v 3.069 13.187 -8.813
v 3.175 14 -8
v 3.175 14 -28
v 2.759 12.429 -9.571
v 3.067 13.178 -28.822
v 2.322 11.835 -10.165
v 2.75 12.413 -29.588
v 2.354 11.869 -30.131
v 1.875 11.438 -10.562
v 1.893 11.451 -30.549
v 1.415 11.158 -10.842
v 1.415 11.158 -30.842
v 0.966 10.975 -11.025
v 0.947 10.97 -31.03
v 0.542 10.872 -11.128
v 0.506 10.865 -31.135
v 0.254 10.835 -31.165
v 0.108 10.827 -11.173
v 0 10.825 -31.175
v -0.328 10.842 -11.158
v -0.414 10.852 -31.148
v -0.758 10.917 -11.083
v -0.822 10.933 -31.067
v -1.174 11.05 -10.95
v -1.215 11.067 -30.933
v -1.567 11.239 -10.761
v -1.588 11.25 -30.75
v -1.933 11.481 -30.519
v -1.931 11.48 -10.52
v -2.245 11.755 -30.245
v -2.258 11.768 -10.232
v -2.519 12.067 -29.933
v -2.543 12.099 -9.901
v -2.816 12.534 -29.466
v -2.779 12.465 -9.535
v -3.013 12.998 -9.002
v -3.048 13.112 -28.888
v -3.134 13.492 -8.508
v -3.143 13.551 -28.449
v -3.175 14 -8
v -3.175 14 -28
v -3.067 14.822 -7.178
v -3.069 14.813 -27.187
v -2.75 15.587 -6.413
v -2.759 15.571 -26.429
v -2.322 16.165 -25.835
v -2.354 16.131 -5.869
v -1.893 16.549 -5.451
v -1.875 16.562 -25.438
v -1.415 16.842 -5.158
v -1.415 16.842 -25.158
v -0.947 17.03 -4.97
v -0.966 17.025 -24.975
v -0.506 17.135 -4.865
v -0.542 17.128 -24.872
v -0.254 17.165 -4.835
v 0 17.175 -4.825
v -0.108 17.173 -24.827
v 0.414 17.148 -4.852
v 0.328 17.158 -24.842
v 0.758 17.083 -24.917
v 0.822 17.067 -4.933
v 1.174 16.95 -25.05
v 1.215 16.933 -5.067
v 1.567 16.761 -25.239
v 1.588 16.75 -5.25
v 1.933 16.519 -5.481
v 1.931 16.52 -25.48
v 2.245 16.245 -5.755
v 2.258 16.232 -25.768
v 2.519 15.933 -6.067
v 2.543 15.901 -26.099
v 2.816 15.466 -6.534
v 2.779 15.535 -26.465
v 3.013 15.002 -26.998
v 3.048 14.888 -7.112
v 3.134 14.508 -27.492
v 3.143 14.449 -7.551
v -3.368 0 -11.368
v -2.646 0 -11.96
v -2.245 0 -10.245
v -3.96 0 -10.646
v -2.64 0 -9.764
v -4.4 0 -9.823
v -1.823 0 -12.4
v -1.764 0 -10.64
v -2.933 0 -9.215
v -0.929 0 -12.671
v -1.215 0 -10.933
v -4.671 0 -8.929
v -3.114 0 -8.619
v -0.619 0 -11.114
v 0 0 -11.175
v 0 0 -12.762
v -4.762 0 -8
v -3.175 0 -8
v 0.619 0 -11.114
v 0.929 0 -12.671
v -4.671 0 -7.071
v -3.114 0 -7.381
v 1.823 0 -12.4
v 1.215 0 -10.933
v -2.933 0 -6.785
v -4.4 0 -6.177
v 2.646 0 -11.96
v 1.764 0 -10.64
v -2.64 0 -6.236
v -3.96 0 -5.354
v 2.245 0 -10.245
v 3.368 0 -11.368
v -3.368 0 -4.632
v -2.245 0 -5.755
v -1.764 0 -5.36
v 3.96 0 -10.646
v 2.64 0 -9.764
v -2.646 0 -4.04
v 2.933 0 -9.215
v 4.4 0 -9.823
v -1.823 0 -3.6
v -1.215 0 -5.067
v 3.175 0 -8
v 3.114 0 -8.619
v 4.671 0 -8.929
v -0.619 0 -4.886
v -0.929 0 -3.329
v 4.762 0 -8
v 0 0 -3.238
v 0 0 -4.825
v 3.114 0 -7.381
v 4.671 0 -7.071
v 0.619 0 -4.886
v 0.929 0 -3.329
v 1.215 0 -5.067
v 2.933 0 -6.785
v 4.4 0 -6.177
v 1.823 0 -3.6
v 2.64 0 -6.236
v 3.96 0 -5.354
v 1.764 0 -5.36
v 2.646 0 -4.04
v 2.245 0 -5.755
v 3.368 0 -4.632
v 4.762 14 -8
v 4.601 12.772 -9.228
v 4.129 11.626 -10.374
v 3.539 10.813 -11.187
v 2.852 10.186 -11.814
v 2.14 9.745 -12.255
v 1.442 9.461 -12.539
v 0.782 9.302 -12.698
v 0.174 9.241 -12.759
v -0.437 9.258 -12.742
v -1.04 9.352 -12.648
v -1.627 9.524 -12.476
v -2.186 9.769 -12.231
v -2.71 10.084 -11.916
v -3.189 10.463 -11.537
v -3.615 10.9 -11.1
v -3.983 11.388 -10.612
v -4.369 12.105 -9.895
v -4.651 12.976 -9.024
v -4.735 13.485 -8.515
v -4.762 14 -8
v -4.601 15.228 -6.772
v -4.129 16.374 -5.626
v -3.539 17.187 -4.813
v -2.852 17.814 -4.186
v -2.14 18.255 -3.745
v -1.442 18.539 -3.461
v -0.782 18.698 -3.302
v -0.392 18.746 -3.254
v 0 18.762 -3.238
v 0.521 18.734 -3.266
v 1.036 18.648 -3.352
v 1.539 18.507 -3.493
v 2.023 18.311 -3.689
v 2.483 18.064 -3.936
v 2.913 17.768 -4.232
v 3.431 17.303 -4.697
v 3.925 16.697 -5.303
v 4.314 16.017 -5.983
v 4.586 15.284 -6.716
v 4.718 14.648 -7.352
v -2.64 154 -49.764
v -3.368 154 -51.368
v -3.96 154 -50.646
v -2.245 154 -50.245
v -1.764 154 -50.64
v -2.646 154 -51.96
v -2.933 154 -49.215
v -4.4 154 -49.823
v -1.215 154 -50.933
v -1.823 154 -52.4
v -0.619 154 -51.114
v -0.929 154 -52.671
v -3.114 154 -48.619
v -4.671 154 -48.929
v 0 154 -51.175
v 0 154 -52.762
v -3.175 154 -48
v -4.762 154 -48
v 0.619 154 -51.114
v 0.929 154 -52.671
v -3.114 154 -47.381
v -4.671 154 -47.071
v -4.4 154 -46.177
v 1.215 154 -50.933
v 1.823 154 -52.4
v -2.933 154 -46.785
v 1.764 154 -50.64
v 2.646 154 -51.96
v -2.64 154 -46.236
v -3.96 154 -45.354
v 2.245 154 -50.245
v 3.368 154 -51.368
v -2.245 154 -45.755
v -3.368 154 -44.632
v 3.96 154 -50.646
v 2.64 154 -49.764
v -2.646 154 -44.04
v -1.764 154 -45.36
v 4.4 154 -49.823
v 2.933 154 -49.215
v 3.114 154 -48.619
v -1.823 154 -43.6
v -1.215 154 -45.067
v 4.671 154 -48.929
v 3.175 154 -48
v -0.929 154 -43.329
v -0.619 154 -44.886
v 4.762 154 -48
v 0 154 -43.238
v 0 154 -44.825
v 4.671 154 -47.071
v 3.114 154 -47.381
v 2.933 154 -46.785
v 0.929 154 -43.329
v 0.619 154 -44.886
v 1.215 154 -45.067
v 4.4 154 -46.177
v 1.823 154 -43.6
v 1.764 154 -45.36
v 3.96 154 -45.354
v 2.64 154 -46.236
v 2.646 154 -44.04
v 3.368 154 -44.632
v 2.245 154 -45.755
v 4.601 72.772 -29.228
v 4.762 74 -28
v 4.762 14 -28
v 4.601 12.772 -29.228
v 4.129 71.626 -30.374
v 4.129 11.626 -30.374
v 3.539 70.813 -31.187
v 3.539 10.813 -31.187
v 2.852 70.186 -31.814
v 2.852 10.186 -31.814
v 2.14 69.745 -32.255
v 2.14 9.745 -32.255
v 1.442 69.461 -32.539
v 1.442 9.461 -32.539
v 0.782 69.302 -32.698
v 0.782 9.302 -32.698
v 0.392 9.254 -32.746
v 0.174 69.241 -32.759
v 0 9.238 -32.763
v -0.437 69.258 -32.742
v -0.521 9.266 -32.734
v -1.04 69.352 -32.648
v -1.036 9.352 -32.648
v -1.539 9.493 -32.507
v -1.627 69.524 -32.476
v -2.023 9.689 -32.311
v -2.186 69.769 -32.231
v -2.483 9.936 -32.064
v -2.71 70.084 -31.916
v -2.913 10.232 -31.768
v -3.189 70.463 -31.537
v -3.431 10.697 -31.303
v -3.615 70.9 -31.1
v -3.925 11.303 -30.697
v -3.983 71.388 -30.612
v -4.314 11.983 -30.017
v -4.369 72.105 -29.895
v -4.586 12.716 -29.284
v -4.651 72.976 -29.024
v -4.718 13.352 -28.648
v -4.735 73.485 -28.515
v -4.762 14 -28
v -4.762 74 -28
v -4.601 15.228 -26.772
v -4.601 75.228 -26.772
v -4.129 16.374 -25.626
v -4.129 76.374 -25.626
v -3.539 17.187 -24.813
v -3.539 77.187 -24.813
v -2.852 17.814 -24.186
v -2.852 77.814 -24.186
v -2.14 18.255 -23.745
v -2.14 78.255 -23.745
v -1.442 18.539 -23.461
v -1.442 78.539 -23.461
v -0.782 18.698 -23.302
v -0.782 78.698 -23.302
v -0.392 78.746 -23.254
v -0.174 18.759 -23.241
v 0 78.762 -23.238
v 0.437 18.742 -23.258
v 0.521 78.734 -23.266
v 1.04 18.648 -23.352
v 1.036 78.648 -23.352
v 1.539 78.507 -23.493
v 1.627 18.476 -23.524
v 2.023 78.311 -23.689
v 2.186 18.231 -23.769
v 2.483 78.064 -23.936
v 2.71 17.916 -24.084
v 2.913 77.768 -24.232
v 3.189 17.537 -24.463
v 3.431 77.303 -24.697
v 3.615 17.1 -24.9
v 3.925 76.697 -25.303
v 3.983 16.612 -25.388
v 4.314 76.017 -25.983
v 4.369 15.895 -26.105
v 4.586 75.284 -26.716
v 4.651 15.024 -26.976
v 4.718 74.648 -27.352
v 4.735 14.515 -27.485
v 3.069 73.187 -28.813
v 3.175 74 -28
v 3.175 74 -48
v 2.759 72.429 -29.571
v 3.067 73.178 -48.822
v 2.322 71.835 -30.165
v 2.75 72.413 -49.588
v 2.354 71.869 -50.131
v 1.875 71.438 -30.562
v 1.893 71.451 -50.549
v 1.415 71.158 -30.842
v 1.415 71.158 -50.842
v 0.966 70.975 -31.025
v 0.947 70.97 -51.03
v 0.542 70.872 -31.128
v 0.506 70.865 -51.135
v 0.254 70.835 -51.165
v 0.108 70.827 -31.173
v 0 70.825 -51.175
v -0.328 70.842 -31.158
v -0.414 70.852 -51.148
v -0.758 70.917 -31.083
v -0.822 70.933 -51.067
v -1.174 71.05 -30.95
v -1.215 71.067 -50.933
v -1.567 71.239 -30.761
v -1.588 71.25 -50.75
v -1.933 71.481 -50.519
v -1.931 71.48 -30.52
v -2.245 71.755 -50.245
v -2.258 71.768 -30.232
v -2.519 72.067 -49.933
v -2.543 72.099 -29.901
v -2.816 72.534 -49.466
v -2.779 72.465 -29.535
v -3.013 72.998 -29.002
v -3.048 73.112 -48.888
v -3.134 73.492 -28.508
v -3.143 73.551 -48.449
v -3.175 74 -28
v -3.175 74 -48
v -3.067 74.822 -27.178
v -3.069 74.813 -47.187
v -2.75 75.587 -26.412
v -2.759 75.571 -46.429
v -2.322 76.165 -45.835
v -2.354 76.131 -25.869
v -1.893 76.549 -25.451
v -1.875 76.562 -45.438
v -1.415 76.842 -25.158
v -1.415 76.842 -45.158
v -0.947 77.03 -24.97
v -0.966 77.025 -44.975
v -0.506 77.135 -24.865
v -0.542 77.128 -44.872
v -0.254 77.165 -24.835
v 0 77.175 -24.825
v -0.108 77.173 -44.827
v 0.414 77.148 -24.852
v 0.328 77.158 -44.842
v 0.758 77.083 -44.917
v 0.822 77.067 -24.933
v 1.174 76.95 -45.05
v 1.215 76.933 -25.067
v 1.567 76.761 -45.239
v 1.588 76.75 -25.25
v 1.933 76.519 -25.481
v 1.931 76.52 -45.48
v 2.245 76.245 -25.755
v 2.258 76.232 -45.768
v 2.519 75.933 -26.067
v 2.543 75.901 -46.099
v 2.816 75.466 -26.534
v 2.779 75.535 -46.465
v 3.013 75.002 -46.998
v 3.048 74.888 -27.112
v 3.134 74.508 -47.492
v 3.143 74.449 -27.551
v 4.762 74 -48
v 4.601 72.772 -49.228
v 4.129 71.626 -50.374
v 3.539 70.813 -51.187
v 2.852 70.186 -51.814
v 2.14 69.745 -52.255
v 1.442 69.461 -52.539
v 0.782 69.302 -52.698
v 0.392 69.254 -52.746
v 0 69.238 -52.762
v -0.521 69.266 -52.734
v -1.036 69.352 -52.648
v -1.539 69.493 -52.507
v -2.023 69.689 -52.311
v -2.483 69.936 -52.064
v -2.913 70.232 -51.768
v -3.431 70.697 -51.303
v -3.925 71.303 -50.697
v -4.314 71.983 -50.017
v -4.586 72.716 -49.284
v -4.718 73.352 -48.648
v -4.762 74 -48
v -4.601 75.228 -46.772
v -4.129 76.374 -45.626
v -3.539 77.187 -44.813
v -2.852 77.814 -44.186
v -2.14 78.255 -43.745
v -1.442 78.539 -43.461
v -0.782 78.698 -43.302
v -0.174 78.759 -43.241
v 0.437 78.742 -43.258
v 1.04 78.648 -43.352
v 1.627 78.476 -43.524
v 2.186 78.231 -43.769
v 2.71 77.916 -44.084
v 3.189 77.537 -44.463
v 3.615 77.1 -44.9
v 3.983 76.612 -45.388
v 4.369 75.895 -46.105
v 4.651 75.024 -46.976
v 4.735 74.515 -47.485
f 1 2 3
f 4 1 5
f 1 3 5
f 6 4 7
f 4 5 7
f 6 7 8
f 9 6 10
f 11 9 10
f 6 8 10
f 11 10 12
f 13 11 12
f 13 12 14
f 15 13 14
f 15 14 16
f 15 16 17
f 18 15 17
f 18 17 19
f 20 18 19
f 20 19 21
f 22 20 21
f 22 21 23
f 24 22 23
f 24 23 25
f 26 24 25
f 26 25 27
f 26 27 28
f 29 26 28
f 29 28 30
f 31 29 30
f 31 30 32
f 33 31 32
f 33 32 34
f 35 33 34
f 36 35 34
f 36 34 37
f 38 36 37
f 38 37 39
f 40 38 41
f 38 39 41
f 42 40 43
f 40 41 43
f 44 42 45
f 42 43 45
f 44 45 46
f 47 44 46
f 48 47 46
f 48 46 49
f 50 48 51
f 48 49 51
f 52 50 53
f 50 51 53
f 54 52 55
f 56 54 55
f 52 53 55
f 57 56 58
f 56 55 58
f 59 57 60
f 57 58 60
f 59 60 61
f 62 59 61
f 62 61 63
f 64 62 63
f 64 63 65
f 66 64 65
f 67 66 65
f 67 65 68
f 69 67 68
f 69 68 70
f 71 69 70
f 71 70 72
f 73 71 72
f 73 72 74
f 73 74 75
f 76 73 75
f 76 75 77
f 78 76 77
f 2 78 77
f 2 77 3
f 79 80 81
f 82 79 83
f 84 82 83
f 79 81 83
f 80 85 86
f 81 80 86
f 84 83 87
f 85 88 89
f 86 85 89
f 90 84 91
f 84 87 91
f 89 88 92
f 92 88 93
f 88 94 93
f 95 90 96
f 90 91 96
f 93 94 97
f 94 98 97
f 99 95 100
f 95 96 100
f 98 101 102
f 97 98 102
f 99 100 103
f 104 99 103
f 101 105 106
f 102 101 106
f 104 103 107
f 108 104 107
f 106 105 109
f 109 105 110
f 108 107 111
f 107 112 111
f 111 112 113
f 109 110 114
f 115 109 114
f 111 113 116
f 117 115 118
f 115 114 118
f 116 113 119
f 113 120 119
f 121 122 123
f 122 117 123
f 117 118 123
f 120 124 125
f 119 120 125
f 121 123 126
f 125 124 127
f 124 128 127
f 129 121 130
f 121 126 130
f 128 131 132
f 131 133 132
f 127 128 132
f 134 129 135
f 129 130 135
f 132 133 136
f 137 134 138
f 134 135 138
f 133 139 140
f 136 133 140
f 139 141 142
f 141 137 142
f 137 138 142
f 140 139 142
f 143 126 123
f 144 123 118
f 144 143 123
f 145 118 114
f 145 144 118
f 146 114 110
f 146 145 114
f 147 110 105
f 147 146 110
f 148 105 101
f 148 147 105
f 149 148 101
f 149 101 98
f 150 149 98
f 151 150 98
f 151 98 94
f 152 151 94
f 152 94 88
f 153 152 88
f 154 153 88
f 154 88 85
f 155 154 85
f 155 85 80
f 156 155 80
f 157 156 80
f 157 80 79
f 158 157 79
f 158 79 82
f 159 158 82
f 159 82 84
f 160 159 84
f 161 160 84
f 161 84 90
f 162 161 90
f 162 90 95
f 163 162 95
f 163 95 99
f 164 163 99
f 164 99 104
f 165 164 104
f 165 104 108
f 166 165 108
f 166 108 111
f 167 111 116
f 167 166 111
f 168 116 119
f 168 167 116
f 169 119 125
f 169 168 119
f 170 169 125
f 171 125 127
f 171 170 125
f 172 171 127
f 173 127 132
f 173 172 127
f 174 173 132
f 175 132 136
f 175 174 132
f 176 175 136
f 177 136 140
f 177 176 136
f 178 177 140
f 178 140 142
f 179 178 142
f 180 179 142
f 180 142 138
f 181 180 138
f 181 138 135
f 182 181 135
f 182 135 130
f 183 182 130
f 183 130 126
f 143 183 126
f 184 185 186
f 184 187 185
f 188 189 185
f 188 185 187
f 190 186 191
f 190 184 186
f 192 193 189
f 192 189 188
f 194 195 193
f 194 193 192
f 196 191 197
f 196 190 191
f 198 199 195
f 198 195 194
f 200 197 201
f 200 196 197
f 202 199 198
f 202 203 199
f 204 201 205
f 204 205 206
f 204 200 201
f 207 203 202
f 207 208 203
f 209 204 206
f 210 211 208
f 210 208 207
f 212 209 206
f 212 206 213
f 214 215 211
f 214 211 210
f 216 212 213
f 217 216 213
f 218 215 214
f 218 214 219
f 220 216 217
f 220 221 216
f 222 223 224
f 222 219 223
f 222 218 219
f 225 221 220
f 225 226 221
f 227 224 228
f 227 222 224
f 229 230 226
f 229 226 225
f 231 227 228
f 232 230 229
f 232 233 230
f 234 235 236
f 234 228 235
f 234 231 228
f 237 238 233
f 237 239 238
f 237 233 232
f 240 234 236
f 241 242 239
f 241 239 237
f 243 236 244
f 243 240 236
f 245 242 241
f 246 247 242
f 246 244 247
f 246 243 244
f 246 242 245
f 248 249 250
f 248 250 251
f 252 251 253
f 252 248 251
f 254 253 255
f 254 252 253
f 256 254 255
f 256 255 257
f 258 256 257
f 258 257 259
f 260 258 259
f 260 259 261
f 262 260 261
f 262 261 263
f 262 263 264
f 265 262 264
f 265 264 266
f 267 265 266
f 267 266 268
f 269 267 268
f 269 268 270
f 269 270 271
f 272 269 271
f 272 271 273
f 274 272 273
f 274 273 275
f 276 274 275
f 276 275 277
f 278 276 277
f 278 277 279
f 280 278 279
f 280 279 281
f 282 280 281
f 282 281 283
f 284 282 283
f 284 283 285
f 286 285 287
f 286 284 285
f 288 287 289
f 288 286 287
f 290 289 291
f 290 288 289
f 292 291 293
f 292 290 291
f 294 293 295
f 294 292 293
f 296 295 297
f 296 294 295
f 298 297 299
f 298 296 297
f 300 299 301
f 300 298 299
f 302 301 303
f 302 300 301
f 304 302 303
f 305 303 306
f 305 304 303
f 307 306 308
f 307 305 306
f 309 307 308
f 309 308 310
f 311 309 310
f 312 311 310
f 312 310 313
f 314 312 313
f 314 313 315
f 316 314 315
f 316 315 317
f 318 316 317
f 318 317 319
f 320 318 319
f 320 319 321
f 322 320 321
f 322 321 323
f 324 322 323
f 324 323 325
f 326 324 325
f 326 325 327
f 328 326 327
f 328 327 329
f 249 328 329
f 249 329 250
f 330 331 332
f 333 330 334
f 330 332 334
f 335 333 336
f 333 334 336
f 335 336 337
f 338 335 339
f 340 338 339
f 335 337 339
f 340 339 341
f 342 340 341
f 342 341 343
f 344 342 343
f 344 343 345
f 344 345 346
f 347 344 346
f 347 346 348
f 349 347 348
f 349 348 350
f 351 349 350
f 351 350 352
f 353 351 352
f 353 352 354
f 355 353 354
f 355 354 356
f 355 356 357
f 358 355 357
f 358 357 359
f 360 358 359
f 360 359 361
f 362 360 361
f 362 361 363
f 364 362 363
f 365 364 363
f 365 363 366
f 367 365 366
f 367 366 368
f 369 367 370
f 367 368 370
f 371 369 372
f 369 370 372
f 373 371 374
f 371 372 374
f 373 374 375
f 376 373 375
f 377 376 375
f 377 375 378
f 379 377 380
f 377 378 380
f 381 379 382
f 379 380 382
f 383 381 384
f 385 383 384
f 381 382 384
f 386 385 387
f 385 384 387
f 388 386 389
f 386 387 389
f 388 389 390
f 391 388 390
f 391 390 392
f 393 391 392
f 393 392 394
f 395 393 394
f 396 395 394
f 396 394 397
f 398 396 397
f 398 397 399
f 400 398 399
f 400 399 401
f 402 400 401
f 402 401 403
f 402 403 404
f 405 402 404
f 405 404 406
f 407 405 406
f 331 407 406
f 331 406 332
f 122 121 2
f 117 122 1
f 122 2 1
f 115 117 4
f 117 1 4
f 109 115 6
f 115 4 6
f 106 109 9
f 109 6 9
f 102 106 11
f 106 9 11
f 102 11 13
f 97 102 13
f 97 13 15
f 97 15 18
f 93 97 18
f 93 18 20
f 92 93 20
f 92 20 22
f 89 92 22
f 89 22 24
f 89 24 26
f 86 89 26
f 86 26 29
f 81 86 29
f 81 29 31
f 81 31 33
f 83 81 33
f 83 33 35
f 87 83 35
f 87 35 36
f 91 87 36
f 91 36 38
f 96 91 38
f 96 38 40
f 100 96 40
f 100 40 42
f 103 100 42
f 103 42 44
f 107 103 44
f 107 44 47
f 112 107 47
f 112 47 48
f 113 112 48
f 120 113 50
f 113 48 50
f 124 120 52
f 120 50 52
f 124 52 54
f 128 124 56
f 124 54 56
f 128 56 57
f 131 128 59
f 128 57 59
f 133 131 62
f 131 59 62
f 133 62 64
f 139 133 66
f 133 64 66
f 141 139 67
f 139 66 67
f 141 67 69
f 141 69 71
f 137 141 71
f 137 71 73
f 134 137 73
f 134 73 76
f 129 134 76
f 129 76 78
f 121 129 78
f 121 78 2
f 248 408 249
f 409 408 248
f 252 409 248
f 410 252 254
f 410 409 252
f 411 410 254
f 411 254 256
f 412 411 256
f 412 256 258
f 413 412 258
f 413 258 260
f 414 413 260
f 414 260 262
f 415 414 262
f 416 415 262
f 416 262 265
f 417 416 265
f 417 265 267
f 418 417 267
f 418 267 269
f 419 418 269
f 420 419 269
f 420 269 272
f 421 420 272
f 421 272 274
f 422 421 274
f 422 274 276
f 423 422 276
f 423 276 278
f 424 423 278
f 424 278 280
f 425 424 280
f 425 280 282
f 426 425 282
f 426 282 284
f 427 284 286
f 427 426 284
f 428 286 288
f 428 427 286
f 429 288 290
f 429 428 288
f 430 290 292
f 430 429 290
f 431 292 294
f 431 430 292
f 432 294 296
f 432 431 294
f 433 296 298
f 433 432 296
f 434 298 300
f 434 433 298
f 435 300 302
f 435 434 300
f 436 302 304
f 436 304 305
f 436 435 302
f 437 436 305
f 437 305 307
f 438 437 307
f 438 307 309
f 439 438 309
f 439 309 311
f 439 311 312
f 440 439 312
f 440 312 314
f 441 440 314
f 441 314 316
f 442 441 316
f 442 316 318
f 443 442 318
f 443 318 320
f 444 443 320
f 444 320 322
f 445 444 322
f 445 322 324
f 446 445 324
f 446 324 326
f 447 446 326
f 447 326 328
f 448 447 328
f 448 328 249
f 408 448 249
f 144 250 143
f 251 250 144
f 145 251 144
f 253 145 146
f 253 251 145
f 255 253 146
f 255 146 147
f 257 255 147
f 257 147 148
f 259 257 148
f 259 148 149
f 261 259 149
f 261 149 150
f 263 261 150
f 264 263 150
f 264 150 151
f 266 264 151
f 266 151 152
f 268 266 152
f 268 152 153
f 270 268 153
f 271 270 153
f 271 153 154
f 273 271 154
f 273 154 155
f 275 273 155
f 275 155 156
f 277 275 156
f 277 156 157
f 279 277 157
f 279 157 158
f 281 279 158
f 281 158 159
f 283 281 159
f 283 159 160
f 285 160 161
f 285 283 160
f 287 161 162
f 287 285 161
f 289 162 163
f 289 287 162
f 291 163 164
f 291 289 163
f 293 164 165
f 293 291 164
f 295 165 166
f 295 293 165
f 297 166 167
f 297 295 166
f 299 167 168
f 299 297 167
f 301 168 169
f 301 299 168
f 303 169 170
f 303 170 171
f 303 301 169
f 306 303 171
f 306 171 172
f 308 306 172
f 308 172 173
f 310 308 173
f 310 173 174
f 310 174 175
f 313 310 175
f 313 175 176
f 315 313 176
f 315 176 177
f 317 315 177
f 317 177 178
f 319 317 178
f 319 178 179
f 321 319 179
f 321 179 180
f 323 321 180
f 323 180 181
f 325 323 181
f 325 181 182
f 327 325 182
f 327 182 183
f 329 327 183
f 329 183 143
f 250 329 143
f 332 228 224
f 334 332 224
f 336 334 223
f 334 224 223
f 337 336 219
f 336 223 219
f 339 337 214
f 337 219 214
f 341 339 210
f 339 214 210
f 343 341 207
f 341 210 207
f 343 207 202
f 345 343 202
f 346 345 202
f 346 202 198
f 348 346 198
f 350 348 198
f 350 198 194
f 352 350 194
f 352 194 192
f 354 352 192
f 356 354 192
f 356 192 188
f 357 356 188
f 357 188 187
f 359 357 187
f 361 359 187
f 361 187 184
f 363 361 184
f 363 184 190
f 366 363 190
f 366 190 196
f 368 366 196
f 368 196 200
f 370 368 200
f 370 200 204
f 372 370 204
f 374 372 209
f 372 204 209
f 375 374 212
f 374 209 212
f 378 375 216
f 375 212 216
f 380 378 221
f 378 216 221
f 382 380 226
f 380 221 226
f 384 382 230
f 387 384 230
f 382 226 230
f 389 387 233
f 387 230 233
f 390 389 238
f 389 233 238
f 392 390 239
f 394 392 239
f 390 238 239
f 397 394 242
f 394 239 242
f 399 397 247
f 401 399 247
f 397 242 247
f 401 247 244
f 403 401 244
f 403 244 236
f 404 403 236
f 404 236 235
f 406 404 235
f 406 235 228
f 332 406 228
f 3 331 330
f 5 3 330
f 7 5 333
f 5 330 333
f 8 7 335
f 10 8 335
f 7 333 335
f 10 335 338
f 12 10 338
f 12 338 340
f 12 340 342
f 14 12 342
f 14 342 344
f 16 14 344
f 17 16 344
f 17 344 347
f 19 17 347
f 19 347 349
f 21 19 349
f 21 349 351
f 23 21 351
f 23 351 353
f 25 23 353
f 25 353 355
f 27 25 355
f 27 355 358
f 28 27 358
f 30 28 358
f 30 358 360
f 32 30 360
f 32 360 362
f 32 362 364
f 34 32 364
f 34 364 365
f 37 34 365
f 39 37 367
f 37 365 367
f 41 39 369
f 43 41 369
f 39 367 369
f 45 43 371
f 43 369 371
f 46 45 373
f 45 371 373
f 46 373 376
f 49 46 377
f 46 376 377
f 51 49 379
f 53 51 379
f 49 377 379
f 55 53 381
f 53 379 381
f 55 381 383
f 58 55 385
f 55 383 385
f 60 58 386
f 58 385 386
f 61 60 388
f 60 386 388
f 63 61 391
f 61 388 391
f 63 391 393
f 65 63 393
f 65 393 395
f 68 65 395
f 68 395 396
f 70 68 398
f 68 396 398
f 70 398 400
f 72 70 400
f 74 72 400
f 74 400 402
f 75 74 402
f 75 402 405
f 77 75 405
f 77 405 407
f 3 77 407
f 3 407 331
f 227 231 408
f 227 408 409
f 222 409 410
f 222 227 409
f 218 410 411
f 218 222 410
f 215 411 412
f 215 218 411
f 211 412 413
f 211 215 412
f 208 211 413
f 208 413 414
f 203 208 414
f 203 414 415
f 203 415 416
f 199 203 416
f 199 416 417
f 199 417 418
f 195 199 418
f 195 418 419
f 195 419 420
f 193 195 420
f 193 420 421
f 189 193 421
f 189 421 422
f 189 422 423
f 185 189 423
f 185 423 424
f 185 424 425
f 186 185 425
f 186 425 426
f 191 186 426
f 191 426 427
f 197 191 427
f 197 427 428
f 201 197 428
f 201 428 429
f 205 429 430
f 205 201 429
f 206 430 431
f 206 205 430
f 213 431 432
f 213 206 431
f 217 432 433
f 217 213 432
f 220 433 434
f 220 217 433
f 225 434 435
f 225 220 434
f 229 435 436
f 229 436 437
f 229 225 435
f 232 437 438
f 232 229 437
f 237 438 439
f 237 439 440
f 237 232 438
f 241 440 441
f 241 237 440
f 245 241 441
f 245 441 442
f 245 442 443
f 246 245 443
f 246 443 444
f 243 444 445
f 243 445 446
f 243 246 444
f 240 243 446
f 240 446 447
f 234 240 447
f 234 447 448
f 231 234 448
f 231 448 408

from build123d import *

# Parameters (mm, degrees)
SKETCH2_R   = 4.7625
SKETCH2_R_2 = 3.175


with BuildPart() as part:
    # Sweep2: sweep along a path in Sketch4
    with BuildLine(Plane(origin=(0, 0, 0), x_dir=(0, 0, -1), z_dir=(1, 0, 0))) as sweep2_path:
        Line((8, 0), (8, 14))
        Line((8, 14), (28, 14))
        Line((28, 14), (28, 74))
        Line((28, 74), (48, 74))
        Line((48, 74), (48, 154))
    # Sketch2 → Sweep2 (sweep)
    with BuildSketch(Plane(origin=(0, 0, 0), x_dir=(1, 0, 0), z_dir=(0, 1, 0))):
        with Locations((0, 8)):
            Circle(SKETCH2_R)
        with Locations((0, 8)):
            Circle(SKETCH2_R_2, mode=Mode.SUBTRACT)
    sweep(path=sweep2_path.line, transition=Transition.RIGHT)


solid = part.part
